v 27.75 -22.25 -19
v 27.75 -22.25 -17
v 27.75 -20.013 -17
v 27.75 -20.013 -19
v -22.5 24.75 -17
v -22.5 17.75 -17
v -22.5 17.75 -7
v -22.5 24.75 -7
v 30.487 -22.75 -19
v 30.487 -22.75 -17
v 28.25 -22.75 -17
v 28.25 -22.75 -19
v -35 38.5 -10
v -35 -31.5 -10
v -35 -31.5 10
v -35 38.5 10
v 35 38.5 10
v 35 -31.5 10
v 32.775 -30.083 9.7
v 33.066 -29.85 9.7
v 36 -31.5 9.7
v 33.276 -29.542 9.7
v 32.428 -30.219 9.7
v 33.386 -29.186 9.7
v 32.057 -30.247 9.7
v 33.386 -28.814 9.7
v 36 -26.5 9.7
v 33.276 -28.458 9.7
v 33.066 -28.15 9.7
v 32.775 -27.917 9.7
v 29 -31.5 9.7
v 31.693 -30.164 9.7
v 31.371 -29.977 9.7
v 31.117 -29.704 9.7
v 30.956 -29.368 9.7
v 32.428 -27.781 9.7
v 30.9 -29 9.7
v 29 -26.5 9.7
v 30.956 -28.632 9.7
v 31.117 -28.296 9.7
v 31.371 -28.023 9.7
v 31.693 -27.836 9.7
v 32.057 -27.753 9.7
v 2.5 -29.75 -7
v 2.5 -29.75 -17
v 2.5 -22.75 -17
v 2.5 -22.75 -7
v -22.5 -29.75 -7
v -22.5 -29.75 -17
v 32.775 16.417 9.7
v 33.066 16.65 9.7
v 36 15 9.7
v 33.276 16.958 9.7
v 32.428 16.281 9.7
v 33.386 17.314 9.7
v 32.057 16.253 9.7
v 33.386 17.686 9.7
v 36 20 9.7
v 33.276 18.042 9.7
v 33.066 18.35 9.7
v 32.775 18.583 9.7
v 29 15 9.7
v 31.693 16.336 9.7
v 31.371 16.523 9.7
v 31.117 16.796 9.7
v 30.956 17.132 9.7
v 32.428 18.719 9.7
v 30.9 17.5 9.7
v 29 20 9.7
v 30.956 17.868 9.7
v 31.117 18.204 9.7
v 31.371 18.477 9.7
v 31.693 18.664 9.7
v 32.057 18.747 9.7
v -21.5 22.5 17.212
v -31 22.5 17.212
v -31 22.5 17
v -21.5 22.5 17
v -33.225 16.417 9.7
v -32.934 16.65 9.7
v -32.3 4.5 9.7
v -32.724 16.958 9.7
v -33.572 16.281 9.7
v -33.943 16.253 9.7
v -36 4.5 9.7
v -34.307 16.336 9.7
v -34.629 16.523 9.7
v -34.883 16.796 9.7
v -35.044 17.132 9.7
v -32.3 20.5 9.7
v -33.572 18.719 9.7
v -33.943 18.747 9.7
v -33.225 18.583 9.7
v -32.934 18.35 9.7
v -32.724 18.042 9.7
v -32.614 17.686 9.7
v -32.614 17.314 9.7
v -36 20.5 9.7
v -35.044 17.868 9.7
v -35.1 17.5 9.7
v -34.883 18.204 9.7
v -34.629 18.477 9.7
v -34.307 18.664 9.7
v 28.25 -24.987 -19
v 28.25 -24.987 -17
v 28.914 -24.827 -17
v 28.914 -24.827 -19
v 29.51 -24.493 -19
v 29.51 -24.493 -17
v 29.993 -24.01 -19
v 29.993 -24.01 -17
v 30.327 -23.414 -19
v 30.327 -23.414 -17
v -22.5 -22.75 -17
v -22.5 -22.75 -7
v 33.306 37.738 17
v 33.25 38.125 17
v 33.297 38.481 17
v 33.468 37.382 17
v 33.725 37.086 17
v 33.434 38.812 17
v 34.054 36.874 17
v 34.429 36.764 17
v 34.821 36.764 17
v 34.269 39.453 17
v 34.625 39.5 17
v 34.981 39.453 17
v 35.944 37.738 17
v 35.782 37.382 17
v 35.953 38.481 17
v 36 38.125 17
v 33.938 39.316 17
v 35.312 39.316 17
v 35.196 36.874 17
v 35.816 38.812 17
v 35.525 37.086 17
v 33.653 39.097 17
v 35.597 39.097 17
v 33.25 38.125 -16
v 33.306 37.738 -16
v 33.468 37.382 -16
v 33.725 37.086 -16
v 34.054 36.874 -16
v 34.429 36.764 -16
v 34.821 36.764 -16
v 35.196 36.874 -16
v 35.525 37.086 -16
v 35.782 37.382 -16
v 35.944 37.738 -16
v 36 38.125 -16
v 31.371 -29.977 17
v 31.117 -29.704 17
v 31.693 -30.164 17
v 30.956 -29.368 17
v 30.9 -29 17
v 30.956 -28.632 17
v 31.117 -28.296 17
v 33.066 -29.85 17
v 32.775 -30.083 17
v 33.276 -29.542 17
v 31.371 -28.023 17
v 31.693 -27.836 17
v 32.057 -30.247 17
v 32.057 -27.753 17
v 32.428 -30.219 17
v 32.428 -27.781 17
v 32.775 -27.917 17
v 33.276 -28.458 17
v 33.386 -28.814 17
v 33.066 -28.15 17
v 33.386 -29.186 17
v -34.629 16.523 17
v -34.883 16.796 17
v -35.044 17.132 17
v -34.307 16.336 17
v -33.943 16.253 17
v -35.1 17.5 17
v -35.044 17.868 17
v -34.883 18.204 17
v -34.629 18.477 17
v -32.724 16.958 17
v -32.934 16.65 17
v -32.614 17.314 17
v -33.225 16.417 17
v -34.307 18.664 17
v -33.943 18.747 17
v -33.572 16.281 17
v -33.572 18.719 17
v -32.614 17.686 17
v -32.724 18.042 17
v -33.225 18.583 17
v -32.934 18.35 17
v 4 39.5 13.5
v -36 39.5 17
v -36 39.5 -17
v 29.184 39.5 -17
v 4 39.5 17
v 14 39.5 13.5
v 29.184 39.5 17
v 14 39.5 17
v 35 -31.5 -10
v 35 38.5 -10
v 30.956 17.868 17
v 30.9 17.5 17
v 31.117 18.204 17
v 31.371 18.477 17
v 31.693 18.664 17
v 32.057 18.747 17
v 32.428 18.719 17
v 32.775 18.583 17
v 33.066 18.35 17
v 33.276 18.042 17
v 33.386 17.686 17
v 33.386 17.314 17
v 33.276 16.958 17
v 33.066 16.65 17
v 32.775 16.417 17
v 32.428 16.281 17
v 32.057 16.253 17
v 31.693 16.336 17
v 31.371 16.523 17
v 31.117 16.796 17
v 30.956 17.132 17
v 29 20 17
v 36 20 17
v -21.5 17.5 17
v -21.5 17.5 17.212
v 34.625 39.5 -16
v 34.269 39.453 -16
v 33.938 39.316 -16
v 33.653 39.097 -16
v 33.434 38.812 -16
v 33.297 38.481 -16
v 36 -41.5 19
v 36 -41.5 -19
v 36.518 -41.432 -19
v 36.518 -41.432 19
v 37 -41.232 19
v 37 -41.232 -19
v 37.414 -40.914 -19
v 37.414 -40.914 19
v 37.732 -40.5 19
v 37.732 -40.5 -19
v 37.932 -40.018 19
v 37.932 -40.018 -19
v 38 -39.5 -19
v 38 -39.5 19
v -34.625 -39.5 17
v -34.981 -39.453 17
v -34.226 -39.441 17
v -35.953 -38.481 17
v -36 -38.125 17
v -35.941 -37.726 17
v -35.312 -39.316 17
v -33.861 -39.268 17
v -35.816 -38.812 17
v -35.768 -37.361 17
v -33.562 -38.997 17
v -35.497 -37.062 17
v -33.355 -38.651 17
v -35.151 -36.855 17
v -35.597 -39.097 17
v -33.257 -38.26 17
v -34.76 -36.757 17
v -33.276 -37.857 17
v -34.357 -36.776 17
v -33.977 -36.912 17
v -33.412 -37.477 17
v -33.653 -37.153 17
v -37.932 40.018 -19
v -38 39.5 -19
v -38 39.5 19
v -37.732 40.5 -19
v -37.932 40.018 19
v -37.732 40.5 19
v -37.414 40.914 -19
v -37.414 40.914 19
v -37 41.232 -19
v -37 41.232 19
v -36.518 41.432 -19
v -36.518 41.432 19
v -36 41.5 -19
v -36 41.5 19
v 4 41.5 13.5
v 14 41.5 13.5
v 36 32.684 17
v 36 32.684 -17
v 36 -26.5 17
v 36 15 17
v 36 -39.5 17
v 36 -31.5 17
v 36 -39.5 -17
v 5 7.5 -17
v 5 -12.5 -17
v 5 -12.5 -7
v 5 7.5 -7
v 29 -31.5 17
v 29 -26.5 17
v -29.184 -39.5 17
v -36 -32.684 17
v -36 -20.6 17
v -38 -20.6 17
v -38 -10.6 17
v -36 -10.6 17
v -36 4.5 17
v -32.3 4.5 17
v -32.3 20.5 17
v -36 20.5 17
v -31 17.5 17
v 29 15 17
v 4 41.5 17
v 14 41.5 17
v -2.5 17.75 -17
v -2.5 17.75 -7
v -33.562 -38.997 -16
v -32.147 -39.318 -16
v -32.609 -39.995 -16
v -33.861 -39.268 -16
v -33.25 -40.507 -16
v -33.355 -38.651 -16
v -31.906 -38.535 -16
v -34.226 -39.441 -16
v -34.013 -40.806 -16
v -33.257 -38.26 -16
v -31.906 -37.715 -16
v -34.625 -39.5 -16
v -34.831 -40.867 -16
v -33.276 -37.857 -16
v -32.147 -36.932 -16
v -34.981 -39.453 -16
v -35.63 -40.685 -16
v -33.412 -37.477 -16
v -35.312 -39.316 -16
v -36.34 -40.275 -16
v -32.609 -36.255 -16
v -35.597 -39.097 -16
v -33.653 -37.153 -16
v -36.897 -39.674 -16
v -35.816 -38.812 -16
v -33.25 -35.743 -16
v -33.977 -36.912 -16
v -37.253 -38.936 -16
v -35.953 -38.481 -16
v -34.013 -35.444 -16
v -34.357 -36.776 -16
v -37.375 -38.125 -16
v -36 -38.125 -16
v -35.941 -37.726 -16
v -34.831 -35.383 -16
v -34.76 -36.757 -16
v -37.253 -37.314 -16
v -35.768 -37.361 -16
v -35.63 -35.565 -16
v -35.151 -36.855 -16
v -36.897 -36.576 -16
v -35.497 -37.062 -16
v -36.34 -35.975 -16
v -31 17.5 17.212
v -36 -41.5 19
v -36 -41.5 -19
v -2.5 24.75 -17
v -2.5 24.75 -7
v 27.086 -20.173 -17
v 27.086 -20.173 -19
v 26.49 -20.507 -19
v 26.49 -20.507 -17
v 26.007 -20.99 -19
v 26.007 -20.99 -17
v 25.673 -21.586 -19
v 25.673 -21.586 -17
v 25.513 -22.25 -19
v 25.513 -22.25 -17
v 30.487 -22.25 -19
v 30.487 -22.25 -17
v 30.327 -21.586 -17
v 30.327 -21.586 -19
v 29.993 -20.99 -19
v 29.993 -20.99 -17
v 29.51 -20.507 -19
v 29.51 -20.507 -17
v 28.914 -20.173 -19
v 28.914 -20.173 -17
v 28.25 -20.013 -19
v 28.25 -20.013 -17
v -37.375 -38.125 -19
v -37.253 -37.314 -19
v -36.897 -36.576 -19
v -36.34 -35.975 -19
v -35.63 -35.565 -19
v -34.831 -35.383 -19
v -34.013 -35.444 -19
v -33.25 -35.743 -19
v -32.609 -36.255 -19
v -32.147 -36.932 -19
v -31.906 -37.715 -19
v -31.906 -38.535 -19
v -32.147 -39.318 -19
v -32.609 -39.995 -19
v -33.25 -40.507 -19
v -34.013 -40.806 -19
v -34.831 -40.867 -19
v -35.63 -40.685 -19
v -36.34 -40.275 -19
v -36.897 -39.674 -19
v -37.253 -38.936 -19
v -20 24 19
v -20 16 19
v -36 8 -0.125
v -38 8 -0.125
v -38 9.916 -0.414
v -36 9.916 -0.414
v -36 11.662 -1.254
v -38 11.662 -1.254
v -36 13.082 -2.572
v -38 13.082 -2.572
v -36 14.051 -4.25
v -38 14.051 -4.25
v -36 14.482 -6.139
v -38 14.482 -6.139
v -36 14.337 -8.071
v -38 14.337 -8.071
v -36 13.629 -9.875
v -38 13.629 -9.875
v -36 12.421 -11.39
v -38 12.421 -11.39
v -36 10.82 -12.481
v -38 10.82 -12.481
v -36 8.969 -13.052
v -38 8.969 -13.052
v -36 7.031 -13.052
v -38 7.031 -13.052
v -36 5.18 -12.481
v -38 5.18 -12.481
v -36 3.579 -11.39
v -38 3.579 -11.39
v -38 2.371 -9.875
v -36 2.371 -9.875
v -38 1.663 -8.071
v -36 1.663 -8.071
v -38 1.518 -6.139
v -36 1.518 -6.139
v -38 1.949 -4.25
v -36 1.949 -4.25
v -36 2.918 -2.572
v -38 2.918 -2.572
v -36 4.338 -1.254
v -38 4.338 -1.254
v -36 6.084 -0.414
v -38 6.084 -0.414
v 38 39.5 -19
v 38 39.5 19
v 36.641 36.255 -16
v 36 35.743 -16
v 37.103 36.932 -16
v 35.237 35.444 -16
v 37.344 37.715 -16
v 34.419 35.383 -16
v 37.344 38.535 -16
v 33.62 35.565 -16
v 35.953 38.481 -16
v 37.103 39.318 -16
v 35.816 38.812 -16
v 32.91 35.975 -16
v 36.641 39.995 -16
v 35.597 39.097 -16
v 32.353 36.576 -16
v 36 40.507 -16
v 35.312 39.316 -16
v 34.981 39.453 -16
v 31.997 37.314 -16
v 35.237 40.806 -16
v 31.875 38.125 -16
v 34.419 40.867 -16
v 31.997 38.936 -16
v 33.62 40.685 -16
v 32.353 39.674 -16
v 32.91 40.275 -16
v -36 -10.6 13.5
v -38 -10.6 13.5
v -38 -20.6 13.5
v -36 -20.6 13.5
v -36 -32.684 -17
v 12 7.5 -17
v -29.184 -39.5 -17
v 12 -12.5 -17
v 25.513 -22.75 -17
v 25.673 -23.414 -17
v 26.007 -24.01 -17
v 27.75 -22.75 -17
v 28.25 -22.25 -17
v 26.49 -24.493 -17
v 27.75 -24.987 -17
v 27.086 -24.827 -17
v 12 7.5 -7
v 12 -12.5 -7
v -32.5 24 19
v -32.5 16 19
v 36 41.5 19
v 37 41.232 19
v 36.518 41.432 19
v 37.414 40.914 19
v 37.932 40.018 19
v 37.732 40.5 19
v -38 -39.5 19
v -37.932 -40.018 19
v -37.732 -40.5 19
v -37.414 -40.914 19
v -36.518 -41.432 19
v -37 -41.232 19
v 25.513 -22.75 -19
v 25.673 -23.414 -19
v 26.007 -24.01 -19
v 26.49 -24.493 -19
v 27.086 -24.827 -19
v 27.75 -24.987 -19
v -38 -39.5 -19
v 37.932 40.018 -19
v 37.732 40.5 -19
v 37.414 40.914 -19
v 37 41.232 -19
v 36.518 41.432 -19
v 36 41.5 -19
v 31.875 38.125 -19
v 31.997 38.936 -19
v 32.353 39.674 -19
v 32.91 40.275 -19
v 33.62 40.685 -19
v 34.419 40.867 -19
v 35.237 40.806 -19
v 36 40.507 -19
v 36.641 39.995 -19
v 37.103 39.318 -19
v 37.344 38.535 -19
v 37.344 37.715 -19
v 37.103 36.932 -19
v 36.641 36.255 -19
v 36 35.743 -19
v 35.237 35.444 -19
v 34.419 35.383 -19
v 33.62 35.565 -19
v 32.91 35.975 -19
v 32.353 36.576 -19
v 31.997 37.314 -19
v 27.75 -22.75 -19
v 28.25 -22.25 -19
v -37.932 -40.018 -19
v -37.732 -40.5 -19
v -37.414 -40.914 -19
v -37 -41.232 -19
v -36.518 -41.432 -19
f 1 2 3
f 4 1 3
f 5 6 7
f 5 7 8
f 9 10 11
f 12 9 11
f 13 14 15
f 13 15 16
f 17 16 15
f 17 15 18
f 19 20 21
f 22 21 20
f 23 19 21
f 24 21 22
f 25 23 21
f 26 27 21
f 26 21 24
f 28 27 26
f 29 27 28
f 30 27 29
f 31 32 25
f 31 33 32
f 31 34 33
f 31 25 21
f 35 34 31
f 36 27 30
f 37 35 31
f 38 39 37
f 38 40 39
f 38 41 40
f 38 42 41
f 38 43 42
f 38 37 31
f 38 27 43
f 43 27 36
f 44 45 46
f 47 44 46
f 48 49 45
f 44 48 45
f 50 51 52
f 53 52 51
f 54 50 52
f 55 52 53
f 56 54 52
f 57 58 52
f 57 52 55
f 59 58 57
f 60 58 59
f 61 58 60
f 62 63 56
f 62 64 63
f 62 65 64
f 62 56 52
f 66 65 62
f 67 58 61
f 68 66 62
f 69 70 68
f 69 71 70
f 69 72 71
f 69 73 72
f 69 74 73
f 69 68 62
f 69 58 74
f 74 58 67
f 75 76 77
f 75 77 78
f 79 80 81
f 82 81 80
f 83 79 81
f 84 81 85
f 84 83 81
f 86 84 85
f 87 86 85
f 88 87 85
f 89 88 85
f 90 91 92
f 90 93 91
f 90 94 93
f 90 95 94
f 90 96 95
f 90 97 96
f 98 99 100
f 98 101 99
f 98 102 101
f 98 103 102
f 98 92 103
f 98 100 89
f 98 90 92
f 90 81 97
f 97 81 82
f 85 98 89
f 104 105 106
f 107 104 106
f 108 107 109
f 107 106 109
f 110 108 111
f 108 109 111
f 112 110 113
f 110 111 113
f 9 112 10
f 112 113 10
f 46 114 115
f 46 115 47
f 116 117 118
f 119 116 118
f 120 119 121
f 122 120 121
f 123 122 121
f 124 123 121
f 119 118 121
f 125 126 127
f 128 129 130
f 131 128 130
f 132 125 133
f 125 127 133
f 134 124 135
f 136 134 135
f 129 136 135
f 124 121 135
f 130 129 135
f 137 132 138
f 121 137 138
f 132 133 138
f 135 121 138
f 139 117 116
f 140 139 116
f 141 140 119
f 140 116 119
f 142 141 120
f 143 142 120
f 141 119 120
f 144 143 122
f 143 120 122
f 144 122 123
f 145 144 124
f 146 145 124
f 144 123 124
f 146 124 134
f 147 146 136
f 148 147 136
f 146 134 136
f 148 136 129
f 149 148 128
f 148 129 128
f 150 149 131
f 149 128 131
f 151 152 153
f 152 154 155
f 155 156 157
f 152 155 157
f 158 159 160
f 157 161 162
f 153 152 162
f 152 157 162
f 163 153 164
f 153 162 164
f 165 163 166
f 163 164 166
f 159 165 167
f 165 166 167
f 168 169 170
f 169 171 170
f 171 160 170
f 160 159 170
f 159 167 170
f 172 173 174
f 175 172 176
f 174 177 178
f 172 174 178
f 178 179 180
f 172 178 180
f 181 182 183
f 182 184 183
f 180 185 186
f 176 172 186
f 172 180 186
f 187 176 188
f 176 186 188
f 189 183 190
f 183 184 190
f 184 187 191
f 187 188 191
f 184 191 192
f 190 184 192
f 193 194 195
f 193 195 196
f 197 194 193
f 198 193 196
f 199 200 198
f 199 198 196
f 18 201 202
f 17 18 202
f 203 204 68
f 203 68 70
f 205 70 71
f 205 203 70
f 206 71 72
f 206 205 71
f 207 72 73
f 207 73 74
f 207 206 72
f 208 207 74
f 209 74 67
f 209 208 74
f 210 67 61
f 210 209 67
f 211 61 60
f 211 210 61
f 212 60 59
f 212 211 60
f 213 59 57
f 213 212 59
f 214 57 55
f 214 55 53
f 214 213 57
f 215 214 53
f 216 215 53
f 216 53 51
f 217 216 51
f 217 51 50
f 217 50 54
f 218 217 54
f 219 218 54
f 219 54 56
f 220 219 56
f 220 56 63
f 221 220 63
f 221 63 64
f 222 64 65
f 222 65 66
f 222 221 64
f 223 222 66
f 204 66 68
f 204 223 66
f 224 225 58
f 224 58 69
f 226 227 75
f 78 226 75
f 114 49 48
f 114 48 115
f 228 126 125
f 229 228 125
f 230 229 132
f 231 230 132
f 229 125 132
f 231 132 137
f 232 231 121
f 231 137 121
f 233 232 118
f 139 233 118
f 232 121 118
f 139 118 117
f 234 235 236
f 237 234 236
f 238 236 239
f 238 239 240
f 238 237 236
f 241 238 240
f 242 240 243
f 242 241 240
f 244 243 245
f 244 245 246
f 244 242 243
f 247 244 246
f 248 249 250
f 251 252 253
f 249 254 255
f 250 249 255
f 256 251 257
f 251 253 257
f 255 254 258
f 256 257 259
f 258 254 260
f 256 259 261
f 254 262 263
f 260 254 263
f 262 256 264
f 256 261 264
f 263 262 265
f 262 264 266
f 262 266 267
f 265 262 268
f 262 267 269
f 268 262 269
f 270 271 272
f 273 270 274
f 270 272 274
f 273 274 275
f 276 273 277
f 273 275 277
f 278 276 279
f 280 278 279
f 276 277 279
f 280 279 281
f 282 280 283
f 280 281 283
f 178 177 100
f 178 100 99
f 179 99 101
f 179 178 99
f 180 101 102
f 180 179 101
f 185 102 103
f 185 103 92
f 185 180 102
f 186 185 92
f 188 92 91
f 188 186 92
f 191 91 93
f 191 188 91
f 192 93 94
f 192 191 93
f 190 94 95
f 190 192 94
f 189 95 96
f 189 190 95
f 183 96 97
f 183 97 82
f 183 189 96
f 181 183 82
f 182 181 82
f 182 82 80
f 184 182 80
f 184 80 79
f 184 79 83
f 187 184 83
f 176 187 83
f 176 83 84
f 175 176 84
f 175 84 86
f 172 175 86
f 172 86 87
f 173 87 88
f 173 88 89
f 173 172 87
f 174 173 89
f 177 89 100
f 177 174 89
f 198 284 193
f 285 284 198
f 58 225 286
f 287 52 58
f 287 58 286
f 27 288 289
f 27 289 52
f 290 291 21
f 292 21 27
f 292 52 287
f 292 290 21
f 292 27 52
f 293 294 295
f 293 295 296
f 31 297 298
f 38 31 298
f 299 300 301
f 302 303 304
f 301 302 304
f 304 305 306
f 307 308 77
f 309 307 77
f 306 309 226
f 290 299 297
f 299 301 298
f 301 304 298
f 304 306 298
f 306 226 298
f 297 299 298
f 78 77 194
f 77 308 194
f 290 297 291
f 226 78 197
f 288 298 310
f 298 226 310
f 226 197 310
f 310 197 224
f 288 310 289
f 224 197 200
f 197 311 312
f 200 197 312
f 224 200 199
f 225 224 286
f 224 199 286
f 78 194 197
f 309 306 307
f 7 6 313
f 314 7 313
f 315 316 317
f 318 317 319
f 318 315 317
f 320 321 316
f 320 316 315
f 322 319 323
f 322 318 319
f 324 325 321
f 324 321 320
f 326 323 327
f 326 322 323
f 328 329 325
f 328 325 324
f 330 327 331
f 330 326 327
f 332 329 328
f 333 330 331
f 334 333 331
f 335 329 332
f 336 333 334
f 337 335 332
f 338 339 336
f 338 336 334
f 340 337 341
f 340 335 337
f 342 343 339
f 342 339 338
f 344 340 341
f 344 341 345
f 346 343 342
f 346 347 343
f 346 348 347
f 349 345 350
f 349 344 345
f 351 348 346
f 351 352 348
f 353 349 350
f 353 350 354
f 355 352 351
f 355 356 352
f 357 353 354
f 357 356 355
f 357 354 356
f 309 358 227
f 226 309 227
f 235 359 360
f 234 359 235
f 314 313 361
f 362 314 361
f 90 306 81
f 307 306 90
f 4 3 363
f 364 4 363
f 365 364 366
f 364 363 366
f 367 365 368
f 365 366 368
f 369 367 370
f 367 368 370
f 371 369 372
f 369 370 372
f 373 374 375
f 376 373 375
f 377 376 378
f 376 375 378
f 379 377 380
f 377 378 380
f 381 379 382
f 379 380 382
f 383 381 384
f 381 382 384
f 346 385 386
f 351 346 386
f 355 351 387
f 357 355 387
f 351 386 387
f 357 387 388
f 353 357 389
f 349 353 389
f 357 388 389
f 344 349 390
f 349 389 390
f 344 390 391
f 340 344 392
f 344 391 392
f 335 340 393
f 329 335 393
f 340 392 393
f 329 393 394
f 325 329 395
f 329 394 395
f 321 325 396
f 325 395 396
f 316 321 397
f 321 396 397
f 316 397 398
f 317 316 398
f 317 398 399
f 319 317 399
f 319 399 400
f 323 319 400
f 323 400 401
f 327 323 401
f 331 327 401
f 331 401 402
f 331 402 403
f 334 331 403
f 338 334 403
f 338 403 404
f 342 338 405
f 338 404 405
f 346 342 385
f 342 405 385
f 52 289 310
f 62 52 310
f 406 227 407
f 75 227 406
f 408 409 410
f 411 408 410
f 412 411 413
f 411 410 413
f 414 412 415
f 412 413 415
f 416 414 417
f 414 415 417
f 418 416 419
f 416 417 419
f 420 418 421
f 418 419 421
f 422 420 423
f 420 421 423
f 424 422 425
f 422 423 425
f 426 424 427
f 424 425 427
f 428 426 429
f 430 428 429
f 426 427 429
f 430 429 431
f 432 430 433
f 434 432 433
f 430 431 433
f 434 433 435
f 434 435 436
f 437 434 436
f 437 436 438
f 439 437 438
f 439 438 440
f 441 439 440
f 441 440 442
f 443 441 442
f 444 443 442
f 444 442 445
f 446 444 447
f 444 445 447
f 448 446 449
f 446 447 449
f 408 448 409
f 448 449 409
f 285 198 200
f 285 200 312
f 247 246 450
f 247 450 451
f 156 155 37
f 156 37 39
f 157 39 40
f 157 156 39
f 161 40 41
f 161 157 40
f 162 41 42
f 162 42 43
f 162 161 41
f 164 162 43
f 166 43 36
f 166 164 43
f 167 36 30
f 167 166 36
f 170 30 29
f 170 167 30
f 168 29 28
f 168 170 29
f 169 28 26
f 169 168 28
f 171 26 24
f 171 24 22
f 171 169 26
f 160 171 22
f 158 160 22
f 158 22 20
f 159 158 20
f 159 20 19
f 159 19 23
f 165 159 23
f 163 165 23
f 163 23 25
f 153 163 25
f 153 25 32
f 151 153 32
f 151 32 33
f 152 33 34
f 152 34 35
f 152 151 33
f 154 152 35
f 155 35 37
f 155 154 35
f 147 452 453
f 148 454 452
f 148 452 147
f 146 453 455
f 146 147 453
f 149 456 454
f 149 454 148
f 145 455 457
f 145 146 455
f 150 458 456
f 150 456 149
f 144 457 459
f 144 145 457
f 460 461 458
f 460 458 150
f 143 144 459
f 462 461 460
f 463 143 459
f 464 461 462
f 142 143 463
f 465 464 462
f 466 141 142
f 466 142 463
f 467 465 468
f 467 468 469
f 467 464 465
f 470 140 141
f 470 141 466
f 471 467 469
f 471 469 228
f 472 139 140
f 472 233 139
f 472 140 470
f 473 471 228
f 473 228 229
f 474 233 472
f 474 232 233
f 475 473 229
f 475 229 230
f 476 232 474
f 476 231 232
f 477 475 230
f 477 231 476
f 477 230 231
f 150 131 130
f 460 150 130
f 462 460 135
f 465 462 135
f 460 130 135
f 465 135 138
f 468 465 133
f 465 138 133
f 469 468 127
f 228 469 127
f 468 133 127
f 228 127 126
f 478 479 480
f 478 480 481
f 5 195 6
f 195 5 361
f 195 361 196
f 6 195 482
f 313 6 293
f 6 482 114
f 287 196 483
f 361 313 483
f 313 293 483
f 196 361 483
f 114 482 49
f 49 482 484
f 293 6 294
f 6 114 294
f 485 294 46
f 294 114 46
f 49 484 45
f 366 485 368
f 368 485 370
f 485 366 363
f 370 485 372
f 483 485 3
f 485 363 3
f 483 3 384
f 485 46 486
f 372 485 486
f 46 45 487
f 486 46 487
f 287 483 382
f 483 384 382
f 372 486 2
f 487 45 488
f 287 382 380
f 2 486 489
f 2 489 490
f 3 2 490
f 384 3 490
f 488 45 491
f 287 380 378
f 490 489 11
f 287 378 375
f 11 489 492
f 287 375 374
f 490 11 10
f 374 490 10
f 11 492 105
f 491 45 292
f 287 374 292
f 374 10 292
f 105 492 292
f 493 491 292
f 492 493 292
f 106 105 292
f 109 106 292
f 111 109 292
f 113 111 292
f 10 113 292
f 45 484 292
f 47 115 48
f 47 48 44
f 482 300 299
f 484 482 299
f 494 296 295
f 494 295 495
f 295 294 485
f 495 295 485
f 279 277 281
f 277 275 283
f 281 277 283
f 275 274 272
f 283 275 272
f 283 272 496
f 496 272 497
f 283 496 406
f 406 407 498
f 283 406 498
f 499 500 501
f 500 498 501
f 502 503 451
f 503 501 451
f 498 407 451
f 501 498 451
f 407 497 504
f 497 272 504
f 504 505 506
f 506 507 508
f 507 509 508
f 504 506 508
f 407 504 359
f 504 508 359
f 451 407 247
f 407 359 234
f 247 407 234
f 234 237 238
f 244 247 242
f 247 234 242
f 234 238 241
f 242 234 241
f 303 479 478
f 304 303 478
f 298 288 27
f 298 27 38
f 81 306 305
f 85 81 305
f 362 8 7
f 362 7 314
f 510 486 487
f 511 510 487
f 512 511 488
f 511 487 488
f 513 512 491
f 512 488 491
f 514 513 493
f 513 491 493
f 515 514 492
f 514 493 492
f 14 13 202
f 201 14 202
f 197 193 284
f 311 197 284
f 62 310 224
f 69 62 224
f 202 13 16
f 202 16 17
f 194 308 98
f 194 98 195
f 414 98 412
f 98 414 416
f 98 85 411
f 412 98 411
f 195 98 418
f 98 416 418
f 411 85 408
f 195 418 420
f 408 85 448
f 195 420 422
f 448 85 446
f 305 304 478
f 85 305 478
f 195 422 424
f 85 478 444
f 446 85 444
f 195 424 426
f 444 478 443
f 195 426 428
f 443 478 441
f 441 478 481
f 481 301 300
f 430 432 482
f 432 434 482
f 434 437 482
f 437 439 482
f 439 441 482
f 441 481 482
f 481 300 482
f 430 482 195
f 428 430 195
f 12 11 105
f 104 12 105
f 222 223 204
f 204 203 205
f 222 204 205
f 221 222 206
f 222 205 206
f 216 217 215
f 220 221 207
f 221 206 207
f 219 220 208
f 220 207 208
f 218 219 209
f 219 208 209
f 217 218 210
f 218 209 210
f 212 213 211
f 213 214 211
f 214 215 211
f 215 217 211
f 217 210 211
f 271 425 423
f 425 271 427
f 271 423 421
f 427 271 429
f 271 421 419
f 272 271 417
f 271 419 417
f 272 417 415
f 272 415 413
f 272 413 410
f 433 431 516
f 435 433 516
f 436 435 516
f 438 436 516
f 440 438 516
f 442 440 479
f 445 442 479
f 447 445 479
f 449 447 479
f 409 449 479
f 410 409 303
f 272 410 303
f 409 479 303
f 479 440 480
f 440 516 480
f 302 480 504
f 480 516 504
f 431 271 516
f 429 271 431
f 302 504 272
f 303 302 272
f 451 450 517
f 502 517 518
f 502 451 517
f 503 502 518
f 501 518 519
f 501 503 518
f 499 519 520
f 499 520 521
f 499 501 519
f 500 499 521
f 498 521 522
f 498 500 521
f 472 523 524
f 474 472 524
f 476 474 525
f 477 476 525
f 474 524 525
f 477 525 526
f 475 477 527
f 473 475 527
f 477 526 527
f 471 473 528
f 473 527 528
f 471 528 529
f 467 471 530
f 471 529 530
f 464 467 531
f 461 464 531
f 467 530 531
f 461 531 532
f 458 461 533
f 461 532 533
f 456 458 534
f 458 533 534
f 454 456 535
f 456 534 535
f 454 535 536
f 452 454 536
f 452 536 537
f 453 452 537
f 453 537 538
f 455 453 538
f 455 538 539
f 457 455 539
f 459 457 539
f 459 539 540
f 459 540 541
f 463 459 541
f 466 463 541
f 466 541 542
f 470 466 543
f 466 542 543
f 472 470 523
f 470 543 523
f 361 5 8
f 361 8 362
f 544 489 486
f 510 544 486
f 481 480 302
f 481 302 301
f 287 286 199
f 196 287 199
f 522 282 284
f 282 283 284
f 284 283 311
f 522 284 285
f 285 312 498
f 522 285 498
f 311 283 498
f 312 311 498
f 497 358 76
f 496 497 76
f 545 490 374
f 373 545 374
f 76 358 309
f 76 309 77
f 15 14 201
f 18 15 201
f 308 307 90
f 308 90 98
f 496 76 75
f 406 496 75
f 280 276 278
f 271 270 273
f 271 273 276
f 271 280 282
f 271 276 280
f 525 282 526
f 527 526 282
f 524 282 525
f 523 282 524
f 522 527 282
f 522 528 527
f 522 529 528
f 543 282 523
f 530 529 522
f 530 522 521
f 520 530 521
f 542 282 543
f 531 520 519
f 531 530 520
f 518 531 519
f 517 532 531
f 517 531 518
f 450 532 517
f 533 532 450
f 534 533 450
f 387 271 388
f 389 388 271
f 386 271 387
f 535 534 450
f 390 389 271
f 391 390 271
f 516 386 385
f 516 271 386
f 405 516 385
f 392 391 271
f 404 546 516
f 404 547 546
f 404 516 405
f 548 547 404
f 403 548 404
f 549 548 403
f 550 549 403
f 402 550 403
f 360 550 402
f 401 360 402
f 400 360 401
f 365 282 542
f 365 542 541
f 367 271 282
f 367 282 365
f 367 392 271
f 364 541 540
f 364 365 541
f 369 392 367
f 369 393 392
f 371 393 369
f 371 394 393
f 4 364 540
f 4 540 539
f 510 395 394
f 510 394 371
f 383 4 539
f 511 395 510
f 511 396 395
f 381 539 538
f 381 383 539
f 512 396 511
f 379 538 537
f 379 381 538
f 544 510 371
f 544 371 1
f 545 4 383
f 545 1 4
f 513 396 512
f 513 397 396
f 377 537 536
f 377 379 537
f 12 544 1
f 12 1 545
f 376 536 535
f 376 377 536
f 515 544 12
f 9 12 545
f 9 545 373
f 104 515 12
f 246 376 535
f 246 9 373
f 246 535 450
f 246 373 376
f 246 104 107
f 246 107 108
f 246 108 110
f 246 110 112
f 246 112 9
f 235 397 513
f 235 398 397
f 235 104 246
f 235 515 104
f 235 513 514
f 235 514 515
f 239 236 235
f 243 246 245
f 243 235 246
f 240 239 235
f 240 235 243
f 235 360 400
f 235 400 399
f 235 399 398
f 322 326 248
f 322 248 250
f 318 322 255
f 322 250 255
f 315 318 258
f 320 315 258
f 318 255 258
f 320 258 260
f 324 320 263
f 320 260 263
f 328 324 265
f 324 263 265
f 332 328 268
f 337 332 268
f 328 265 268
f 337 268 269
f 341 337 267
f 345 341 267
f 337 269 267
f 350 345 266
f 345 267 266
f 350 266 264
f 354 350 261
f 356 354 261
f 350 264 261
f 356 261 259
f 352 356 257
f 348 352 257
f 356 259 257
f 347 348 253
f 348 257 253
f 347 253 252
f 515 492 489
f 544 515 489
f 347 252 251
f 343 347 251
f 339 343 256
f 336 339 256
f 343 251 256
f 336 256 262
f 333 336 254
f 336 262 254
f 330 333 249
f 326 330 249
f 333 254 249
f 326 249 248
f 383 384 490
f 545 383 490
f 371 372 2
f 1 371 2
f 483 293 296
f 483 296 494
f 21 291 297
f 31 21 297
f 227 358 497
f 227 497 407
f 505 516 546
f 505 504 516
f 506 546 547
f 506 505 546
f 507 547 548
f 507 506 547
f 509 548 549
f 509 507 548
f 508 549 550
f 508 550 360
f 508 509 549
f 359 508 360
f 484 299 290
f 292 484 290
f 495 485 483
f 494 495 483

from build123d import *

# Parameters (mm, degrees)
BOSS_EXTRUDE2_DEPTH      = 39.5
BOSS_EXTRUDE2_DEPTH_BACK = 39.5
SKETCH1_W                = 76
SKETCH1_H                = 38
SKETCH1_W_2              = 72
SKETCH1_H_2              = 34
SKETCH2_W                = 76
SKETCH2_H                = 38
BOSS_EXTRUDE3_DEPTH      = 2
BOSS_EXTRUDE4_DEPTH      = 10
BOSS_EXTRUDE4_DEPTH_BACK = 10
SKETCH6_W                = 70
SKETCH6_H                = 70
FILLET1_R                = 2
CUT_EXTRUDE1_DEPTH       = 1
CUT_EXTRUDE1_DEPTH_BACK  = 2.5
SKETCH7_W                = 2
SKETCH7_H                = 10
SKETCH7_W_2              = 10
SKETCH7_H_2              = 2
SKETCH8_R                = 6.5
CUT_EXTRUDE2_DEPTH       = 2
SKETCH9_W                = 20
SKETCH9_H                = 7
SKETCH9_W_2              = 25
SKETCH9_W_3              = 7
SKETCH9_H_2              = 20
BOSS_EXTRUDE5_DEPTH      = 10
SKETCH10_W               = 9.5
SKETCH10_H               = 5
CUT_EXTRUDE3_DEPTH       = 2
CHAMFER1_SIZE            = 1.5
CHAMFER1_SIZE2           = 1.787630389
SKETCH11_W               = 3.7
SKETCH11_H               = 16
SKETCH11_R               = 1.25
SKETCH11_W_2             = 7
SKETCH11_H_2             = 5
BOSS_EXTRUDE10_DEPTH     = 7.3
CUT_EXTRUDE6_DEPTH       = 60.390655831
BOSS_EXTRUDE11_REACH     = 68.8
SKETCH17_R               = 2.75
CUT_EXTRUDE9_DEPTH       = 3


with BuildPart() as part:
    # Sketch1 → Boss-Extrude2 (new, two sides: drawn at the far end of the back side and taken through both)
    with BuildSketch(Plane(origin=(0, 0, 0), x_dir=(1, 0, 0), z_dir=(0, 1, 0)).offset(-BOSS_EXTRUDE2_DEPTH_BACK)):
        Rectangle(SKETCH1_W, SKETCH1_H)
        Rectangle(SKETCH1_W_2, SKETCH1_H_2, mode=Mode.SUBTRACT)
    extrude(amount=BOSS_EXTRUDE2_DEPTH + BOSS_EXTRUDE2_DEPTH_BACK)

    # Sketch2 → Boss-Extrude3 (add)
    with BuildSketch(Plane.XZ.offset(39.5)):
        Rectangle(SKETCH2_W, SKETCH2_H)
    boss_extrude3 = extrude(amount=BOSS_EXTRUDE3_DEPTH)

    # Mirror1: Boss-Extrude3 across plane
    add(boss_extrude3.mirror(Plane.ZX))

    # Fillet1
    fillet1_edges = [part.edges().sort_by_distance(p)[0] for p in [
        (38, -41.5, 0),
        (-38, -41.5, 0),
        (38, 41.5, 0),
        (-38, 41.5, 0),
    ]]
    fillet(fillet1_edges, radius=FILLET1_R)

    # Sketch7 → Cut-Extrude1 (cut, two sides: drawn at the far end of the back side and taken through both)
    with BuildSketch(Plane.XY.offset(16).offset(-CUT_EXTRUDE1_DEPTH_BACK)):
        with Locations((-37, -15.6)):
            Rectangle(SKETCH7_W, SKETCH7_H)
        with Locations((9, 40.5)):
            Rectangle(SKETCH7_W_2, SKETCH7_H_2)
    extrude(amount=CUT_EXTRUDE1_DEPTH + CUT_EXTRUDE1_DEPTH_BACK, mode=Mode.SUBTRACT)

    # Sketch8 → Cut-Extrude2 (cut)
    with BuildSketch(Plane.ZY.offset(38)):
        with Locations((-6.625, 8)):
            Circle(SKETCH8_R)
    extrude(amount=-CUT_EXTRUDE2_DEPTH, mode=Mode.SUBTRACT)

    # Sketch9 → Boss-Extrude5 (add)
    with BuildSketch(Plane.XY.offset(-17)):
        with Locations((-12.5, 21.25)):
            Rectangle(SKETCH9_W, SKETCH9_H)
        with Locations((-10, -26.25)):
            Rectangle(SKETCH9_W_2, SKETCH9_H)
        with Locations((8.5, -2.5)):
            Rectangle(SKETCH9_W_3, SKETCH9_H_2)
    extrude(amount=BOSS_EXTRUDE5_DEPTH)

    # Sketch10 → Cut-Extrude3 (cut)
    with BuildSketch(Plane.XY.offset(19)):
        with Locations((-26.25, 20)):
            Rectangle(SKETCH10_W, SKETCH10_H)
    extrude(amount=-CUT_EXTRUDE3_DEPTH, mode=Mode.SUBTRACT)

    # Chamfer1
    chamfer1_edges = [part.edges().sort_by_distance(p)[0] for p in [
        (-21.5, 20, 19),
        (-26.25, 22.5, 19),
        (-31, 20, 19),
        (-26.25, 17.5, 19),
    ]]
    chamfer1_side = [part.faces().sort_by_distance(p)[0] for p in [
        (0.199274696, -0.15182834, 19),
    ]]
    chamfer(chamfer1_edges, length=CHAMFER1_SIZE, length2=CHAMFER1_SIZE2, reference=chamfer1_side[0])

    # Sketch11 → Boss-Extrude10 (add)
    # profile 1 of 3: a face of its own
    with BuildSketch(Plane(origin=(0, 0, 17), x_dir=(-1, 0, 0), z_dir=(0, 0, -1))):
        with Locations((34.15, 12.5)):
            Rectangle(SKETCH11_W, SKETCH11_H)
        with Locations((33.85, 17.5)):
            Circle(SKETCH11_R, mode=Mode.SUBTRACT)
    # profile 2 of 3: a face of its own
    with BuildSketch(Plane(origin=(0, 0, 17), x_dir=(-1, 0, 0), z_dir=(0, 0, -1))):
        with Locations((-32.5, 17.5)):
            Rectangle(SKETCH11_W_2, SKETCH11_H_2)
        with Locations((-32.15, 17.5)):
            Circle(SKETCH11_R, mode=Mode.SUBTRACT)
    # profile 3 of 3: a face of its own
    with BuildSketch(Plane(origin=(0, 0, 17), x_dir=(-1, 0, 0), z_dir=(0, 0, -1))):
        with Locations((-32.5, -29)):
            Rectangle(SKETCH11_W_2, SKETCH11_H_2)
        with Locations((-32.15, -29)):
            Circle(SKETCH11_R, mode=Mode.SUBTRACT)
    extrude(amount=BOSS_EXTRUDE10_DEPTH)

    # Sketch15 → Cut-Extrude6 (cut, through all)
    with BuildSketch(Plane.XY):
        with BuildLine():
            Line((28.25, -22.25), (30.487468593, -22.25))
            ThreePointArc((30.487468593, -22.25), (29.767766953, -20.732233047), (28.25, -20.012531407))
            Line((28.25, -20.012531407), (28.25, -22.25))
        make_face()
        with BuildLine():
            Line((25.512531407, -22.25), (27.75, -22.25))
            Line((27.75, -22.25), (27.75, -20.012531407))
            ThreePointArc((27.75, -20.012531407), (26.232233047, -20.732233047), (25.512531407, -22.25))
        make_face()
        with BuildLine():
            Line((27.75, -24.987468593), (27.75, -22.75))
            Line((27.75, -22.75), (25.512531407, -22.75))
            ThreePointArc((25.512531407, -22.75), (26.232233047, -24.267766953), (27.75, -24.987468593))
        make_face()
        with BuildLine():
            Line((30.487468593, -22.75), (28.25, -22.75))
            Line((28.25, -22.75), (28.25, -24.987468593))
            ThreePointArc((28.25, -24.987468593), (29.767766953, -24.267766953), (30.487468593, -22.75))
        make_face()
    extrude(amount=-CUT_EXTRUDE6_DEPTH, mode=Mode.SUBTRACT)

    # Sketch16 → Boss-Extrude11 (add, up to next)
    with BuildSketch(Plane(origin=(0, 0, 17), x_dir=(-1, 0, 0), z_dir=(0, 0, -1)), mode=Mode.PRIVATE) as boss_extrude11_sk1:
        with BuildLine():
            Line((-36, 35.600123765), (-36, 32.684136008))
            Line((-36, 32.684136008), (-32.592068004, 36.092068004))
            ThreePointArc((-32.592068004, 36.092068004), (-34.214243489, 35.279494054), (-36, 35.600123765))
        make_face()
    boss_extrude11_tool1 = extrude(boss_extrude11_sk1.sketch, amount=BOSS_EXTRUDE11_REACH, mode=Mode.PRIVATE) - part.part
    # Sketch16 → Boss-Extrude11 (add, up to next)
    with BuildSketch(Plane(origin=(0, 0, 17), x_dir=(-1, 0, 0), z_dir=(0, 0, -1)), mode=Mode.PRIVATE) as boss_extrude11_sk2:
        with BuildLine():
            ThreePointArc((-36, 35.600123765), (-34.214243489, 35.279494054), (-32.592068004, 36.092068004))
            ThreePointArc((-32.592068004, 36.092068004), (-31.968846344, 37.024785132), (-31.75, 38.125))
            ThreePointArc((-31.75, 38.125), (-31.838905585, 38.834438449), (-32.100123765, 39.5))
            Line((-32.100123765, 39.5), (-34.625, 39.5))
            ThreePointArc((-34.625, 39.5), (-33.652728176, 39.097271824), (-33.25, 38.125))
            ThreePointArc((-33.25, 38.125), (-34.625, 36.75), (-36, 38.125))
            Line((-36, 38.125), (-36, 35.600123765))
        make_face()
    boss_extrude11_tool2 = extrude(boss_extrude11_sk2.sketch, amount=BOSS_EXTRUDE11_REACH, mode=Mode.PRIVATE) - part.part
    # Sketch16 → Boss-Extrude11 (add, up to next)
    with BuildSketch(Plane(origin=(0, 0, 17), x_dir=(-1, 0, 0), z_dir=(0, 0, -1)), mode=Mode.PRIVATE) as boss_extrude11_sk3:
        with BuildLine():
            ThreePointArc((-31.75, 38.125), (-31.968846344, 37.024785132), (-32.592068004, 36.092068004))
            Line((-32.592068004, 36.092068004), (-29.184136008, 39.5))
            Line((-29.184136008, 39.5), (-32.100123765, 39.5))
            ThreePointArc((-32.100123765, 39.5), (-31.838905585, 38.834438449), (-31.75, 38.125))
        make_face()
    boss_extrude11_tool3 = extrude(boss_extrude11_sk3.sketch, amount=BOSS_EXTRUDE11_REACH, mode=Mode.PRIVATE) - part.part
    # Sketch16 → Boss-Extrude11 (add, up to next)
    with BuildSketch(Plane(origin=(0, 0, 17), x_dir=(-1, 0, 0), z_dir=(0, 0, -1)), mode=Mode.PRIVATE) as boss_extrude11_sk4:
        with BuildLine():
            Line((-36, 39.5), (-36, 38.125))
            ThreePointArc((-36, 38.125), (-35.597271824, 39.097271824), (-34.625, 39.5))
            Line((-34.625, 39.5), (-36, 39.5))
        make_face()
    boss_extrude11_tool4 = extrude(boss_extrude11_sk4.sketch, amount=BOSS_EXTRUDE11_REACH, mode=Mode.PRIVATE) - part.part
    # Sketch16 → Boss-Extrude11 (add, up to next)
    with BuildSketch(Plane(origin=(0, 0, 17), x_dir=(-1, 0, 0), z_dir=(0, 0, -1)), mode=Mode.PRIVATE) as boss_extrude11_sk5:
        with BuildLine():
            ThreePointArc((36, -38.125), (35.597271824, -39.097271824), (34.625, -39.5))
            Line((34.625, -39.5), (36, -39.5))
            Line((36, -39.5), (36, -38.125))
        make_face()
    boss_extrude11_tool5 = extrude(boss_extrude11_sk5.sketch, amount=BOSS_EXTRUDE11_REACH, mode=Mode.PRIVATE) - part.part
    # Sketch16 → Boss-Extrude11 (add, up to next)
    with BuildSketch(Plane(origin=(0, 0, 17), x_dir=(-1, 0, 0), z_dir=(0, 0, -1)), mode=Mode.PRIVATE) as boss_extrude11_sk6:
        with BuildLine():
            ThreePointArc((36, -35.600123765), (34.214243489, -35.279494054), (32.592068004, -36.092068004))
            ThreePointArc((32.592068004, -36.092068004), (31.779494054, -37.714243489), (32.100123765, -39.5))
            Line((32.100123765, -39.5), (34.625, -39.5))
            ThreePointArc((34.625, -39.5), (33.652728176, -37.152728176), (36, -38.125))
            Line((36, -38.125), (36, -35.600123765))
        make_face()
    boss_extrude11_tool6 = extrude(boss_extrude11_sk6.sketch, amount=BOSS_EXTRUDE11_REACH, mode=Mode.PRIVATE) - part.part
    # Sketch16 → Boss-Extrude11 (add, up to next)
    with BuildSketch(Plane(origin=(0, 0, 17), x_dir=(-1, 0, 0), z_dir=(0, 0, -1)), mode=Mode.PRIVATE) as boss_extrude11_sk7:
        with BuildLine():
            Line((36, -32.684136008), (32.592068004, -36.092068004))
            ThreePointArc((32.592068004, -36.092068004), (34.214243489, -35.279494054), (36, -35.600123765))
            Line((36, -35.600123765), (36, -32.684136008))
        make_face()
    boss_extrude11_tool7 = extrude(boss_extrude11_sk7.sketch, amount=BOSS_EXTRUDE11_REACH, mode=Mode.PRIVATE) - part.part
    # Sketch16 → Boss-Extrude11 (add, up to next)
    with BuildSketch(Plane(origin=(0, 0, 17), x_dir=(-1, 0, 0), z_dir=(0, 0, -1)), mode=Mode.PRIVATE) as boss_extrude11_sk8:
        with BuildLine():
            Line((32.592068004, -36.092068004), (29.184136008, -39.5))
            Line((29.184136008, -39.5), (32.100123765, -39.5))
            ThreePointArc((32.100123765, -39.5), (31.779494054, -37.714243489), (32.592068004, -36.092068004))
        make_face()
    boss_extrude11_tool8 = extrude(boss_extrude11_sk8.sketch, amount=BOSS_EXTRUDE11_REACH, mode=Mode.PRIVATE) - part.part
    add(boss_extrude11_tool1.solids().sort_by_distance((35.086577, 34.486498, 17))[0])
    add(boss_extrude11_tool2.solids().sort_by_distance((33.6128, 37.1128, 17))[0])
    add(boss_extrude11_tool3.solids().sort_by_distance((30.986498, 38.586577, 17))[0])
    add(boss_extrude11_tool4.solids().sort_by_distance((35.692869, 39.192869, 17))[0])
    add(boss_extrude11_tool5.solids().sort_by_distance((-35.692869, -39.192869, 17))[0])
    add(boss_extrude11_tool6.solids().sort_by_distance((-33.6128, -37.1128, 17))[0])
    add(boss_extrude11_tool7.solids().sort_by_distance((-35.086577, -34.486498, 17))[0])
    add(boss_extrude11_tool8.solids().sort_by_distance((-30.986498, -38.586577, 17))[0])

    # Sketch17 → Cut-Extrude9 (cut)
    with BuildSketch(Plane(origin=(0, 0, -19), x_dir=(-1, 0, 0), z_dir=(0, 0, -1))):
        with Locations((-34.625, 38.125)):
            Circle(SKETCH17_R)
        with Locations((34.625, -38.125)):
            Circle(SKETCH17_R)
    extrude(amount=-CUT_EXTRUDE9_DEPTH, mode=Mode.SUBTRACT)


with BuildPart() as body_2:
    # Sketch6 → Boss-Extrude4 (new, two sides: drawn at the far end of the back side and taken through both)
    with BuildSketch(Plane.XY.offset(-BOSS_EXTRUDE4_DEPTH_BACK)):
        with Locations((0, 3.5)):
            Rectangle(SKETCH6_W, SKETCH6_H)
    extrude(amount=BOSS_EXTRUDE4_DEPTH + BOSS_EXTRUDE4_DEPTH_BACK)


solid = Compound([part.part, body_2.part])
